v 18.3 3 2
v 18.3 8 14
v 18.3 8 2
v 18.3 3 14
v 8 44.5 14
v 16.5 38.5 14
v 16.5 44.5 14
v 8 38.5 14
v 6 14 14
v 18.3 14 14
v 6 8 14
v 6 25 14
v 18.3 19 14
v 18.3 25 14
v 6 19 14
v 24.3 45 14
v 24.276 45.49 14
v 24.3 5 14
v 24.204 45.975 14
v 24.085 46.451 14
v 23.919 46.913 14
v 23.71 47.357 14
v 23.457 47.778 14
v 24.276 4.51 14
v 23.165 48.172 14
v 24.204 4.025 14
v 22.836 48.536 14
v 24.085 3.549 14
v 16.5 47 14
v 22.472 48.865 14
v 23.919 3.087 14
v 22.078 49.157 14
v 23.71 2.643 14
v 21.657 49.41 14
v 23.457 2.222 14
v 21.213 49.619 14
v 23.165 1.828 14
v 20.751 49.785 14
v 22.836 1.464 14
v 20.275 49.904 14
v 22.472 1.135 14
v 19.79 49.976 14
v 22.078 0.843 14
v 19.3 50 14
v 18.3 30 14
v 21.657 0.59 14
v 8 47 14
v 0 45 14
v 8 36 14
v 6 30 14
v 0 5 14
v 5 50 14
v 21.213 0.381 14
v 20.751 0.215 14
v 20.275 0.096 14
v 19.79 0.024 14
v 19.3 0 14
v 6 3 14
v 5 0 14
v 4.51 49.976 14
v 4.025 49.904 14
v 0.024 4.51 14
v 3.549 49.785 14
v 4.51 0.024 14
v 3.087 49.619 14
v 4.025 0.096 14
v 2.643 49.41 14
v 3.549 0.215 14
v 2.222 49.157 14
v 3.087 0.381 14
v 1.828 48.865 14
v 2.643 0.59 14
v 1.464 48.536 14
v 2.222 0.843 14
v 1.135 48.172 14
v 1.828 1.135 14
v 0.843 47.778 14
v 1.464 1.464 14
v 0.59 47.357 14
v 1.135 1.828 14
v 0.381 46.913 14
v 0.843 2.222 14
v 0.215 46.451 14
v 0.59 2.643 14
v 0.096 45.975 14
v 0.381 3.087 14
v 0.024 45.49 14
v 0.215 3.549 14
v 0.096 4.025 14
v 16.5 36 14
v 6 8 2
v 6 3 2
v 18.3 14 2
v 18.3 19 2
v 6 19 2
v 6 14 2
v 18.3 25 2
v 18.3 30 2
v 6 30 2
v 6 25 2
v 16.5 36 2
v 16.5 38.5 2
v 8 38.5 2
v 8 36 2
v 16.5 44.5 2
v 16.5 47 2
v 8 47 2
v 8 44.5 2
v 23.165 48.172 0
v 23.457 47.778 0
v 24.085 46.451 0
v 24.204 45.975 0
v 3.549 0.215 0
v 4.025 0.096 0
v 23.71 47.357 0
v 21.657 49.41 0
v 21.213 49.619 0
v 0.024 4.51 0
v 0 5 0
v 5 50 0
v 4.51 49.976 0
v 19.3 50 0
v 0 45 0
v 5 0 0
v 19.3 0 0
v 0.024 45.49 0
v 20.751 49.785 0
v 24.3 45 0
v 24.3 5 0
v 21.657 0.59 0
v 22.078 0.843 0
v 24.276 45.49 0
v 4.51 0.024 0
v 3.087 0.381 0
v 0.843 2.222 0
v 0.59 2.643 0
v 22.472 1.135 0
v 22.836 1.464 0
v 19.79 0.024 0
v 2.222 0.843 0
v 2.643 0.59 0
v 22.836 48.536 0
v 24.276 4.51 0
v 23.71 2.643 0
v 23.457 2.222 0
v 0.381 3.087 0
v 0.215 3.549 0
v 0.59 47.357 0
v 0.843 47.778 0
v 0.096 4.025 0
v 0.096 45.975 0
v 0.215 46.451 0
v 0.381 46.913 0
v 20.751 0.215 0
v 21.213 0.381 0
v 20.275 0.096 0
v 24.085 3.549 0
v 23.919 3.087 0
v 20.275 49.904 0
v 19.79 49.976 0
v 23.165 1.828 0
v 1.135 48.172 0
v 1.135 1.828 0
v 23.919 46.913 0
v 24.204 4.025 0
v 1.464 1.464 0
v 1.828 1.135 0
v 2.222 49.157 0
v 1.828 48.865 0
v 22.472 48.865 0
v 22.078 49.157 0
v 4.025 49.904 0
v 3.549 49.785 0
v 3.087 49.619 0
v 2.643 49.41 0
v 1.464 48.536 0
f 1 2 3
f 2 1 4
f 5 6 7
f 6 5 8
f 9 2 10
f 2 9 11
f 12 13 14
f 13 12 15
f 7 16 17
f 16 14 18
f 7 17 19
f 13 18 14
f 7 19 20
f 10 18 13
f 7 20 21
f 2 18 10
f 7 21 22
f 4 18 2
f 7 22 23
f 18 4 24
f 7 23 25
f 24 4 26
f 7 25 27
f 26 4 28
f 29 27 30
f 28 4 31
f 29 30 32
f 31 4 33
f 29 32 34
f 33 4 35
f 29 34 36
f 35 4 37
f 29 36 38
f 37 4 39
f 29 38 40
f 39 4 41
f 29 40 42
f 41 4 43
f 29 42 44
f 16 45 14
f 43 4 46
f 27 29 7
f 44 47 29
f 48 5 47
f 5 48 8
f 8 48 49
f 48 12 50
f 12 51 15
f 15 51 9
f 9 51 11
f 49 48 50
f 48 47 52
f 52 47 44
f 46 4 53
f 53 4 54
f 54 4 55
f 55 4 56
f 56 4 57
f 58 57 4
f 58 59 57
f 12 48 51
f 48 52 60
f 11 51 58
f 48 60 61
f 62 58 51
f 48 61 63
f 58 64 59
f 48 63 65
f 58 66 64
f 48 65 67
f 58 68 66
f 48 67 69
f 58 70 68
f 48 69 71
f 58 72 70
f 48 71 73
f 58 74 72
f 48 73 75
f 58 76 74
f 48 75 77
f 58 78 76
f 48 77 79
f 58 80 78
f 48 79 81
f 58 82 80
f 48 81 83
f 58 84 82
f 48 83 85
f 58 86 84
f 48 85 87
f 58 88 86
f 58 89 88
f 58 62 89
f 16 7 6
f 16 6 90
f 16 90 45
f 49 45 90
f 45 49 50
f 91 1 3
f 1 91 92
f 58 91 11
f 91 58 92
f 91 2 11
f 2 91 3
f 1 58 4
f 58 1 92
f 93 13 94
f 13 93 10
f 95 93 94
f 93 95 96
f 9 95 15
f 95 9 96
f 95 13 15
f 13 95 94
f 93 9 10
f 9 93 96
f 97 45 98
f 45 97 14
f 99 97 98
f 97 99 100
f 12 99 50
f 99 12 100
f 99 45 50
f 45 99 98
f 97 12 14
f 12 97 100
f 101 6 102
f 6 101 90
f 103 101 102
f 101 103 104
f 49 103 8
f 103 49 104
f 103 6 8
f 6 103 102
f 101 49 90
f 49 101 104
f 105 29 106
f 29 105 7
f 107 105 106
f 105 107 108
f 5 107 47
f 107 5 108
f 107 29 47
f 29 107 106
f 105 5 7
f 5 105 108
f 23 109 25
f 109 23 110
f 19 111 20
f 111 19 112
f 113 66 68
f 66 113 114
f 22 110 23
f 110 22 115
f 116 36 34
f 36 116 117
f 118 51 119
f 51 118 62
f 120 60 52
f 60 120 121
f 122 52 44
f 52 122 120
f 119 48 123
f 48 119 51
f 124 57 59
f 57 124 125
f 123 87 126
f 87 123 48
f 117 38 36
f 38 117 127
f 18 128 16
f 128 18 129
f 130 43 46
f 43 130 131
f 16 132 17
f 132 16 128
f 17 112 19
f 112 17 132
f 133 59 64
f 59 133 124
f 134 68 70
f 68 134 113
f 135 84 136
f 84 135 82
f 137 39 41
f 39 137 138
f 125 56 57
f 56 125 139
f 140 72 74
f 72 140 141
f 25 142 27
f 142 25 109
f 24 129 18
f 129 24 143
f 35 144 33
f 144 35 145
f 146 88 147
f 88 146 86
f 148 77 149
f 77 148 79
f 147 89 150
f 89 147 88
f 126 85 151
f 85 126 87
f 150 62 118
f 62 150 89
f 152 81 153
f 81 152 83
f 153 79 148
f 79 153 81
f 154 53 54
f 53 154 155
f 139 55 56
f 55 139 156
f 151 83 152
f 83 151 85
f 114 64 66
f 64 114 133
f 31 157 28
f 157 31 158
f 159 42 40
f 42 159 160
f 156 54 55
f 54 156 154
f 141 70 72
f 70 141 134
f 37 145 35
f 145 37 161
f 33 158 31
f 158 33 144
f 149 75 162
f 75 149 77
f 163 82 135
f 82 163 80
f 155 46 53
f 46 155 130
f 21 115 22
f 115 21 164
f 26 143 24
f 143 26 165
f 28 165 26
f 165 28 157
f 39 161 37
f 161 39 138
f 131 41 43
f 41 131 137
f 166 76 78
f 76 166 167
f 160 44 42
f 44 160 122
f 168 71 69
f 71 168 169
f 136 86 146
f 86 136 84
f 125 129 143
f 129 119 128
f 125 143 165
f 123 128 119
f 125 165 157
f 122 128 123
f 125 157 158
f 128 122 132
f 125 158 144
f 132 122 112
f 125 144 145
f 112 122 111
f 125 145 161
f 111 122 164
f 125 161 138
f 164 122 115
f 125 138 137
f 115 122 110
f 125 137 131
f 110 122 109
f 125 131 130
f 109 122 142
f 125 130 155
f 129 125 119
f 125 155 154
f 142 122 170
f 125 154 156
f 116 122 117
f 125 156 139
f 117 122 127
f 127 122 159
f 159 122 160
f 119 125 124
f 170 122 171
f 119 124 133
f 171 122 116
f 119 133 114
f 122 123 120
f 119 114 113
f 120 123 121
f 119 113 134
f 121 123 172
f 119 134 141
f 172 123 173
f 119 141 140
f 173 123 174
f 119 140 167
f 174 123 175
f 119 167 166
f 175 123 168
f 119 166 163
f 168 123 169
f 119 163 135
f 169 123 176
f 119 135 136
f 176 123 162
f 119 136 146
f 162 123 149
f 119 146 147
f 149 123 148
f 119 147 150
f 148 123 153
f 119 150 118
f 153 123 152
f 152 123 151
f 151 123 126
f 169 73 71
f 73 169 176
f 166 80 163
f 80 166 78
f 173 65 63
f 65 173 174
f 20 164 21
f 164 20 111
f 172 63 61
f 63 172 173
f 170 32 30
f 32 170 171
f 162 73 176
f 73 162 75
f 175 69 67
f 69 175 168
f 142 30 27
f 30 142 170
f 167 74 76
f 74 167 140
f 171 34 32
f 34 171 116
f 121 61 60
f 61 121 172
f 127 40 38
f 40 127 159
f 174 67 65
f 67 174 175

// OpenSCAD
// USB Type A ports
usba = 3;
// USB Type C ports
usbc = 2;

// Margin
margin = 6;

// Corner radius
corner = 5;

// ========================
// Rounded rectangle module
// ========================
module rounded_rect(x, y, radius) {
    minkowski() {
        square([x - 2*radius, y - 2*radius], center = false);
        circle(r = radius, $fn = 64);
    }
}

// ===============================
// Stand for USB stick and devices
// ===============================
module stand() {

    case_height = 14;

    case_width = 24.3;
    case_lenght = usba*(5+margin) + usbc*(2.5+margin);

    difference() {
        // Outer shell (walls included)
        translate([corner, corner, 0])
            linear_extrude(height = case_height)
                rounded_rect(case_width, case_lenght, corner);
        
        // USB Type A
        if (usba > 0) {
            translate([margin, margin/2, 2]) {
                for (a = [0 : usba-1]) {
                    translate([0, a*(5+margin), 0])
                        cube([12.3, 5, 12]);
                }
            }
        }

        // USB Type C
        if (usbc > 0) {
            posc = margin/2+usba*(5+margin);
            for (c = [0 : usbc-1]) {
                translate([margin+(12.5-8.5)/2, posc+c*(2.5+margin), 2])
                    cube([8.5, 2.5, 12]);
            }
        }
    }
}

stand();
